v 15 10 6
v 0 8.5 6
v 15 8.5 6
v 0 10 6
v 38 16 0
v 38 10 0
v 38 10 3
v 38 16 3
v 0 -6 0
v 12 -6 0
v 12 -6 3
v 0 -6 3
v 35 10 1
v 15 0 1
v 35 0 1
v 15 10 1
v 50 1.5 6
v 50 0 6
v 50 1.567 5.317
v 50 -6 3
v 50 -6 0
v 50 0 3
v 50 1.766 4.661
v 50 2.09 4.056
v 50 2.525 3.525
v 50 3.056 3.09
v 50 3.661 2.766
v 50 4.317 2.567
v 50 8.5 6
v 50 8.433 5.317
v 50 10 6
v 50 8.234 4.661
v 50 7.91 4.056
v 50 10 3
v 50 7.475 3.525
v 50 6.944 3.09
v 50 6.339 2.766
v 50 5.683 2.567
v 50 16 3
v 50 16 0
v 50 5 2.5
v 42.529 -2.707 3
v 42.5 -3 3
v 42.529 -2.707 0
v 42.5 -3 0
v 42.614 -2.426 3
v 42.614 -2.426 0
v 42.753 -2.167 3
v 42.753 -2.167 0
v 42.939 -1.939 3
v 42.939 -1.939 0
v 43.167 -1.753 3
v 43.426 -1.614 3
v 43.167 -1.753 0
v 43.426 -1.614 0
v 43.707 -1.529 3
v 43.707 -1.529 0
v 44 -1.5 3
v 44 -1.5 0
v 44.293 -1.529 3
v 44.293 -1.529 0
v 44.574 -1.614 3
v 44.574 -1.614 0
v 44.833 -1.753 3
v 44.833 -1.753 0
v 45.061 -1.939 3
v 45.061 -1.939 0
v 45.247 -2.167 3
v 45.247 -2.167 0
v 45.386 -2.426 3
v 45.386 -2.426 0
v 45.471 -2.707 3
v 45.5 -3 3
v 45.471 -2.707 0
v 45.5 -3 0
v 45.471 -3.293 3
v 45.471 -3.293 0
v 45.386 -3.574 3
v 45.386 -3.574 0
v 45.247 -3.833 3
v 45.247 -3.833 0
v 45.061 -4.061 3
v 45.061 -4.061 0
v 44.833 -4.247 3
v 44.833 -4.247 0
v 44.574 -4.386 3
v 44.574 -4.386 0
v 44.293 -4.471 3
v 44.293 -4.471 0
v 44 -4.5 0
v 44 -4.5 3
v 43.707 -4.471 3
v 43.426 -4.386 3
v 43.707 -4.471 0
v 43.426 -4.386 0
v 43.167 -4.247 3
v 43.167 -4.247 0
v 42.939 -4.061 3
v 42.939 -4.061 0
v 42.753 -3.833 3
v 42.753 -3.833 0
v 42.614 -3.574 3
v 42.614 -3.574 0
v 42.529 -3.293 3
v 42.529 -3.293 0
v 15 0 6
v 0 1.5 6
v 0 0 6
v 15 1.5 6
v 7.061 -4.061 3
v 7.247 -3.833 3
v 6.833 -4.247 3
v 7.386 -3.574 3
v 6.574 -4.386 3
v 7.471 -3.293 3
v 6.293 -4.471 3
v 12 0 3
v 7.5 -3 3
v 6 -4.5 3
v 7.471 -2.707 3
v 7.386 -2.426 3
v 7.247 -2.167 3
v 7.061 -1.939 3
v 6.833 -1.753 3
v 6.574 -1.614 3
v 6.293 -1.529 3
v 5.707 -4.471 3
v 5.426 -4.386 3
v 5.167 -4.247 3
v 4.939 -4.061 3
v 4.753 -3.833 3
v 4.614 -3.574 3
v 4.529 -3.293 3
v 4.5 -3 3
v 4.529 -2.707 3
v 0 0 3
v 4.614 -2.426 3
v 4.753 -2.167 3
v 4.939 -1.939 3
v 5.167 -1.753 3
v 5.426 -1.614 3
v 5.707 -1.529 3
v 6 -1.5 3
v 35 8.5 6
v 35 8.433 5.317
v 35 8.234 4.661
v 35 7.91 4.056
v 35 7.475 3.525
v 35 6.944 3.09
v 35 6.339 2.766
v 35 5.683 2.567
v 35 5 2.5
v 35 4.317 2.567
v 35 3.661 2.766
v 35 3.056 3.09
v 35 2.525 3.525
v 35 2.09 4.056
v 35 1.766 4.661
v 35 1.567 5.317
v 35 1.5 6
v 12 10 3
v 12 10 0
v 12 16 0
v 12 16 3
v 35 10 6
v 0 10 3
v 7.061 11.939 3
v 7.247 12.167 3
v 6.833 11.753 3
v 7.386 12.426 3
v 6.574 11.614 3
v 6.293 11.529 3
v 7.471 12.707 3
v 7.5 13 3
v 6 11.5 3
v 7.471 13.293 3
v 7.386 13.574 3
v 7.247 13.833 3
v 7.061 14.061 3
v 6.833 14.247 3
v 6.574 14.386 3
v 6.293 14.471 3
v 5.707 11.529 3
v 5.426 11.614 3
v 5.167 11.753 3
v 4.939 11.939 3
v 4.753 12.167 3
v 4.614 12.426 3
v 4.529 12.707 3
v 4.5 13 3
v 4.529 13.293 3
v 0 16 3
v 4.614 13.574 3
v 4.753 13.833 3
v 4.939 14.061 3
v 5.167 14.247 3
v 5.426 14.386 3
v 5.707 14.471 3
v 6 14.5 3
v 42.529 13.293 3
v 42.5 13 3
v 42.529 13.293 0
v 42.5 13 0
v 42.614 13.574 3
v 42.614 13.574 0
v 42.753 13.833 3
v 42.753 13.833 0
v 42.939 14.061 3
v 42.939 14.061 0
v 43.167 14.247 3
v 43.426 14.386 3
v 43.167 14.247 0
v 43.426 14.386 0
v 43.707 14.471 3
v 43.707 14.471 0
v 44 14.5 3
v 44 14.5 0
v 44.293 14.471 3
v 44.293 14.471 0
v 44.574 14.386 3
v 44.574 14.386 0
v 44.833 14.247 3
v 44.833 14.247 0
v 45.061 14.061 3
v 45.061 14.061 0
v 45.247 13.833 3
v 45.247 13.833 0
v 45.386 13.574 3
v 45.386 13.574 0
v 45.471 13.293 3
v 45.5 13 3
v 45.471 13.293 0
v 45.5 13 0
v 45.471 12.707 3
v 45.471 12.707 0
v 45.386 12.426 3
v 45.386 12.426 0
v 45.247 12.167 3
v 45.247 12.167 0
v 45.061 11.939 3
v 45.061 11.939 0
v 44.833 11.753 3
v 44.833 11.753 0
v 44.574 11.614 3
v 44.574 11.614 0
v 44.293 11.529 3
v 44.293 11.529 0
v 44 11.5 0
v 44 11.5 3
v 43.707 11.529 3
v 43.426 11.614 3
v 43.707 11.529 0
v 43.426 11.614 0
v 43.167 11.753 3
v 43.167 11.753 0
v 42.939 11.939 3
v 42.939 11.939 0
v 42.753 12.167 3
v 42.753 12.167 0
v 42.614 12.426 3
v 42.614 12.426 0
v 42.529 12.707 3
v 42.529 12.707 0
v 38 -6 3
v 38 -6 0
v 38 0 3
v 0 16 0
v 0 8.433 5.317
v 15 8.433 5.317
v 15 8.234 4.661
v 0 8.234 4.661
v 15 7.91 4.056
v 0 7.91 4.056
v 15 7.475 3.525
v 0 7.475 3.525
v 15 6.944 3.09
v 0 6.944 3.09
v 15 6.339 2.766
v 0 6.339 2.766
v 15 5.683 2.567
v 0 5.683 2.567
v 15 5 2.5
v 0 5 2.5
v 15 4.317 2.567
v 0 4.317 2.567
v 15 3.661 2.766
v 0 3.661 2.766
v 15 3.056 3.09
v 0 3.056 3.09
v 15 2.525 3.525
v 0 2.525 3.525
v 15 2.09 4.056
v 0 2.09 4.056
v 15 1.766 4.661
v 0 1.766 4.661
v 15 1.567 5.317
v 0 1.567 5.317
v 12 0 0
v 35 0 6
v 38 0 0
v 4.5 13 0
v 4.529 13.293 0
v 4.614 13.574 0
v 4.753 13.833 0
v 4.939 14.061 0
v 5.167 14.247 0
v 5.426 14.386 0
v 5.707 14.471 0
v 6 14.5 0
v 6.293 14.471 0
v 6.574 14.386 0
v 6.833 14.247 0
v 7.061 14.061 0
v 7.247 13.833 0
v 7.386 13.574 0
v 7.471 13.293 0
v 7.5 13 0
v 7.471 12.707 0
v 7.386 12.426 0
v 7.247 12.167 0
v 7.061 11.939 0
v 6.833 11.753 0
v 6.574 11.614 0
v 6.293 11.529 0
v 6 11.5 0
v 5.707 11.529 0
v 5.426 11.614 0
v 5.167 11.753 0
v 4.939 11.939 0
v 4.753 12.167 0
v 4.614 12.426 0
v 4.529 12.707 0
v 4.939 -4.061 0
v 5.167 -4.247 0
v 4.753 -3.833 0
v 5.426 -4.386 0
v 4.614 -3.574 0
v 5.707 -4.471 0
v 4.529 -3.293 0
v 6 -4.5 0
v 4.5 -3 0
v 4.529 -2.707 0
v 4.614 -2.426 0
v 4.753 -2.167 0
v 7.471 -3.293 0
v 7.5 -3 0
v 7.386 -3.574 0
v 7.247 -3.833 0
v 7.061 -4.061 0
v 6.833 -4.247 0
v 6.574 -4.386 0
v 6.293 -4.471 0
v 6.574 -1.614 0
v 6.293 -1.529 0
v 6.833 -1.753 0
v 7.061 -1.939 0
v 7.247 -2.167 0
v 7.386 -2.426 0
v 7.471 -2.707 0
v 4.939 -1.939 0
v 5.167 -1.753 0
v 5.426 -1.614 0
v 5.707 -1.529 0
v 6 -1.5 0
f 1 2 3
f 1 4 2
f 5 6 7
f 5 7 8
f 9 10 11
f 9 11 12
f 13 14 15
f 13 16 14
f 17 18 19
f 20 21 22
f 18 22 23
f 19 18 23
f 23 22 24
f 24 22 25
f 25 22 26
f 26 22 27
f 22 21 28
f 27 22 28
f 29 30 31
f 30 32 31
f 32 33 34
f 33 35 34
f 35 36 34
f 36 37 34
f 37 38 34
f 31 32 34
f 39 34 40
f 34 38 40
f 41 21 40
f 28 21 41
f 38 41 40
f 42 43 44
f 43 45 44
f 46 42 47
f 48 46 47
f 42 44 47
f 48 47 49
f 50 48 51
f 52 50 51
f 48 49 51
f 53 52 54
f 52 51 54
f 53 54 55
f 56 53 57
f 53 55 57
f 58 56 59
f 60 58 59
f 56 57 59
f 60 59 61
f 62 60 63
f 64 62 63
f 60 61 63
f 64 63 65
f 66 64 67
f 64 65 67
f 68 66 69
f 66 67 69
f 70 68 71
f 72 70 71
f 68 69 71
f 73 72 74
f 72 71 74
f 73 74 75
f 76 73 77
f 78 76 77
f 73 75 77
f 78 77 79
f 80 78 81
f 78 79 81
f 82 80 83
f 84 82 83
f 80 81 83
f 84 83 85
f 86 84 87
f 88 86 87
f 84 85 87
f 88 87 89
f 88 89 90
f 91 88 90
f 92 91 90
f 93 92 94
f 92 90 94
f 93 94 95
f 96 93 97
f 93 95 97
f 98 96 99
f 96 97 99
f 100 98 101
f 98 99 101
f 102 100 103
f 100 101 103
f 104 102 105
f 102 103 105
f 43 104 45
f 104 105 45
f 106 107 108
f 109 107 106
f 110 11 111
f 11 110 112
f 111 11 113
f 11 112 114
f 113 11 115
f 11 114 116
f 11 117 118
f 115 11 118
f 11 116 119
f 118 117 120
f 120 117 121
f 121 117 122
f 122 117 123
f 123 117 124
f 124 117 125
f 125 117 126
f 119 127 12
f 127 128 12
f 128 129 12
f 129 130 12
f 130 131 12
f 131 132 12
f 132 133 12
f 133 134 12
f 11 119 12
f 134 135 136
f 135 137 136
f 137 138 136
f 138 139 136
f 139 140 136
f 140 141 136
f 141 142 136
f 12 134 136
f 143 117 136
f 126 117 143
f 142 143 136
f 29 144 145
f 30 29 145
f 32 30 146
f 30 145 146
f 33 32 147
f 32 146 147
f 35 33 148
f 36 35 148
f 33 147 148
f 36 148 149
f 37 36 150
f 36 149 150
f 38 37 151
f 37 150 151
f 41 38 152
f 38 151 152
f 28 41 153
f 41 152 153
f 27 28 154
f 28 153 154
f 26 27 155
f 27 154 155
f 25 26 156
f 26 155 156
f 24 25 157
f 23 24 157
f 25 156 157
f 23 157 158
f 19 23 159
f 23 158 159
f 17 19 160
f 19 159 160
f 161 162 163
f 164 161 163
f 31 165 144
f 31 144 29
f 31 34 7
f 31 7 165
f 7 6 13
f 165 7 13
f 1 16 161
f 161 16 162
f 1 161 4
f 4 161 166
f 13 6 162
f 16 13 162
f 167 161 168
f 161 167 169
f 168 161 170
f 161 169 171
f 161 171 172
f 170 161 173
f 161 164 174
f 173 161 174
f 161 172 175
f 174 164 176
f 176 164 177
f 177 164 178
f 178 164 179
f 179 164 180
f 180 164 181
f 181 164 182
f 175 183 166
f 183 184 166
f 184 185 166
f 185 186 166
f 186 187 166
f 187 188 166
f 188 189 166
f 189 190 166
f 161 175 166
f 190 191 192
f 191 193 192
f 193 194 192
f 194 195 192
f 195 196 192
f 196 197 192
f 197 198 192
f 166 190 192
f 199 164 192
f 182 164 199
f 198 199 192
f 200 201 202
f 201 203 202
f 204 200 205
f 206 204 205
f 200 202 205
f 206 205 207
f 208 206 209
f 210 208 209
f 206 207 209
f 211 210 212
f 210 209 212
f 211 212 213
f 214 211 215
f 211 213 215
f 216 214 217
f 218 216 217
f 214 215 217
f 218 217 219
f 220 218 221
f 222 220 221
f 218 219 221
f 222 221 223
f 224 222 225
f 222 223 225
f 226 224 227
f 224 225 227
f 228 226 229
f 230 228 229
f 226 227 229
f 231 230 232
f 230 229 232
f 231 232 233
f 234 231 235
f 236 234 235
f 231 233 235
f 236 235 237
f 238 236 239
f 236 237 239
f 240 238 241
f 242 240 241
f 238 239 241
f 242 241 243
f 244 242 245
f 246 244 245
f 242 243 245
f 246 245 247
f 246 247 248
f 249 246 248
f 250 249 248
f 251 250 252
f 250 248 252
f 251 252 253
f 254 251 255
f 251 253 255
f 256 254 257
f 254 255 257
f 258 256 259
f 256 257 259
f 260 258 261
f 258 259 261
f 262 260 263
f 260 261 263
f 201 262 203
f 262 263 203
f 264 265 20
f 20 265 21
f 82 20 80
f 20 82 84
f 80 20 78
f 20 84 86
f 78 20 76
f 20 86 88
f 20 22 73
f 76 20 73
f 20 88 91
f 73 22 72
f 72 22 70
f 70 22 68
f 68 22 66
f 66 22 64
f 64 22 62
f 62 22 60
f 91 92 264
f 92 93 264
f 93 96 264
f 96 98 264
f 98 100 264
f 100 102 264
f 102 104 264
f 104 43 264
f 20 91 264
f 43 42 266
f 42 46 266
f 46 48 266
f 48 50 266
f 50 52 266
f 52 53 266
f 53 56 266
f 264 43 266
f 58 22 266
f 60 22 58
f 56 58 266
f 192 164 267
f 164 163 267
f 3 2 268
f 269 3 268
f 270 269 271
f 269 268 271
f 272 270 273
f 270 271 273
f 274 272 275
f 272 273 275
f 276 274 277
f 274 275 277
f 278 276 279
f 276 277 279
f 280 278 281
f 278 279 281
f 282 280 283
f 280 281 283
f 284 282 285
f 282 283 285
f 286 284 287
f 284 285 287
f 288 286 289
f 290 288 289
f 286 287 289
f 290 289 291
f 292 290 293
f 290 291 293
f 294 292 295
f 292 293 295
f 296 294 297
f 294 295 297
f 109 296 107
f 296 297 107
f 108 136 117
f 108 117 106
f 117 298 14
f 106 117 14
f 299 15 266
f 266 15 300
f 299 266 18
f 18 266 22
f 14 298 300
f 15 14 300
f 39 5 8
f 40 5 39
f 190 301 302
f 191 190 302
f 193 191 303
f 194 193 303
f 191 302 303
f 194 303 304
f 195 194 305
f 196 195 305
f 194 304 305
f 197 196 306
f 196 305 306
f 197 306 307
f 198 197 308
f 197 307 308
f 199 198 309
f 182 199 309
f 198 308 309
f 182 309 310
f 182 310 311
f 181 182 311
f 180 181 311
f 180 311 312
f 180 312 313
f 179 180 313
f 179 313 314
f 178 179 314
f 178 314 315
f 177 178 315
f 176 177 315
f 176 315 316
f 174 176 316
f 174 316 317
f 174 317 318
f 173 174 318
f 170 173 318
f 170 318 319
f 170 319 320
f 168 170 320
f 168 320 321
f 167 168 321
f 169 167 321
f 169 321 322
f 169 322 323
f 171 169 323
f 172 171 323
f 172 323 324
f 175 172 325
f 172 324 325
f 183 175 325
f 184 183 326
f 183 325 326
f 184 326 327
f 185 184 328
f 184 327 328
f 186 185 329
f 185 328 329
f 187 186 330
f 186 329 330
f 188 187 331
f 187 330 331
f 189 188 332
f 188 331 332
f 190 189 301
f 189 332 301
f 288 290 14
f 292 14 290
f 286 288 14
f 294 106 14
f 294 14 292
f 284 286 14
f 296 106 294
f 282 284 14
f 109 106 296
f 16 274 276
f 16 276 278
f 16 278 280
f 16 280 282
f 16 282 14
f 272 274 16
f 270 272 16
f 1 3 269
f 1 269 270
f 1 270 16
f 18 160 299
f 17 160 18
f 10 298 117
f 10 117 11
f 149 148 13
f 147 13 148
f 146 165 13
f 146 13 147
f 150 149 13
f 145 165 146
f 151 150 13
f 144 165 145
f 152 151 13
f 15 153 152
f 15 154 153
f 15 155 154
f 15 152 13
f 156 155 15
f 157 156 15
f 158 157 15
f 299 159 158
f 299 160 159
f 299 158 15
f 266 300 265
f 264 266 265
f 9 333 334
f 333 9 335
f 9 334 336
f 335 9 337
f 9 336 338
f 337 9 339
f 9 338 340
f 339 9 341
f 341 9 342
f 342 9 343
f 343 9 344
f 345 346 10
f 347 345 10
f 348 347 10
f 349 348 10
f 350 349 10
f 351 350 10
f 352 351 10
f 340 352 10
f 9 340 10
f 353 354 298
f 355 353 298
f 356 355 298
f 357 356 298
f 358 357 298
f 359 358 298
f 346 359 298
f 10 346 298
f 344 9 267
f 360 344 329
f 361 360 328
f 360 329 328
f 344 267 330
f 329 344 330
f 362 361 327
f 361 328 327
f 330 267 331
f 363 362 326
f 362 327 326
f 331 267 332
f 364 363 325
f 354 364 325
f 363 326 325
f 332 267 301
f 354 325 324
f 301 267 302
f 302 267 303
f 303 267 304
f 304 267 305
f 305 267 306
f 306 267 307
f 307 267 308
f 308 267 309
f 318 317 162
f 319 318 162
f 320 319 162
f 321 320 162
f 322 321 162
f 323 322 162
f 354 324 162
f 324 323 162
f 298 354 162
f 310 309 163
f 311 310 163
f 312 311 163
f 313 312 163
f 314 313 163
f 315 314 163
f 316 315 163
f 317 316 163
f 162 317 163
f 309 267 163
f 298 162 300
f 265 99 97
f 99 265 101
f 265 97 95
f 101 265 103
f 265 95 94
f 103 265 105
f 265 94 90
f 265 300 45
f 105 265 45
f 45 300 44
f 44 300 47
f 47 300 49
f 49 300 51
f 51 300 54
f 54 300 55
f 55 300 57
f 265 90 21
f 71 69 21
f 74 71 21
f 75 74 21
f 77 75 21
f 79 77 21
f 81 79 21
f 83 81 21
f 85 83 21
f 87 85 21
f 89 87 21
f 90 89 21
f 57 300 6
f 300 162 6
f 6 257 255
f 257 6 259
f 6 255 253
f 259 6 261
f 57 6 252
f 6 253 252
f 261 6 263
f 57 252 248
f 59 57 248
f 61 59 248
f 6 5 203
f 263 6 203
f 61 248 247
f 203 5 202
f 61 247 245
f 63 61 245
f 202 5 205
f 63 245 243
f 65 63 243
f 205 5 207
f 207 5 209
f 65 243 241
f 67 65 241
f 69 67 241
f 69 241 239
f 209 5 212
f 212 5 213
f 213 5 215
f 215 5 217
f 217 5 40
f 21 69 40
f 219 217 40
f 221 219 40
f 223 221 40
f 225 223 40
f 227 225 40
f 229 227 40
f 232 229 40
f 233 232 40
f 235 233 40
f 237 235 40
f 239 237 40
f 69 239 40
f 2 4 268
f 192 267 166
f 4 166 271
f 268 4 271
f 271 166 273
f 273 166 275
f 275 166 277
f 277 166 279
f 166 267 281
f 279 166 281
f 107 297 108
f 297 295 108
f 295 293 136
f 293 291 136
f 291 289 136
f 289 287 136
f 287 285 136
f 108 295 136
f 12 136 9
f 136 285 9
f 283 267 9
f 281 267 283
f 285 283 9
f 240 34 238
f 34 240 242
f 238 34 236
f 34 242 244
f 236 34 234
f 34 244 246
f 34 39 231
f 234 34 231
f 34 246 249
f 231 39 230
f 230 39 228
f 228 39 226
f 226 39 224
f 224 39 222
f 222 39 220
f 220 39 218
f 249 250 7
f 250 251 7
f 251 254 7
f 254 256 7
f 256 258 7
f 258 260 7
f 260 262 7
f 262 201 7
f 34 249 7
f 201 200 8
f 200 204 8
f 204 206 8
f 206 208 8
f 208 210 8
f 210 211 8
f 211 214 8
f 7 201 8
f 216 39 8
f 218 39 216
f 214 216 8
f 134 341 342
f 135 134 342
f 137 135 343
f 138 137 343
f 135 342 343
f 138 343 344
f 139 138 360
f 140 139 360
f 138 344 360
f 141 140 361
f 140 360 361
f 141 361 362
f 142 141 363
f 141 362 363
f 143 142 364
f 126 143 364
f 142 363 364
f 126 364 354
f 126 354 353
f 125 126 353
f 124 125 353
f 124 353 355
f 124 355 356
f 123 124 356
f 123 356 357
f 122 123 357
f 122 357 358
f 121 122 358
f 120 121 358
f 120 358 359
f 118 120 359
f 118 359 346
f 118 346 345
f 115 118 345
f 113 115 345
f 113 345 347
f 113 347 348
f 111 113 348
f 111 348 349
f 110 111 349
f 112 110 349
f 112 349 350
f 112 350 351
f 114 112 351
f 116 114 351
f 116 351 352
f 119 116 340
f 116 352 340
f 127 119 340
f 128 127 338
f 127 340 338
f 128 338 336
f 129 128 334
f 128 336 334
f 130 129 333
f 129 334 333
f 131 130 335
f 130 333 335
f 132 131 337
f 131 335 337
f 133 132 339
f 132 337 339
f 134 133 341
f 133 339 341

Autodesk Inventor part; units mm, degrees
ref_plane "YZ Plane" through (0, 0, 0) normal (1, 0, 0) x (0, 1, 0)
ref_plane "XZ Plane" through (0, 0, 0) normal (0, 1, 0) x (-1, 0, 0)
ref_plane "XY Plane" through (0, 0, 0) normal (0, 0, 1) x (1, 0, 0)
sketch "Sketch1" plane through (0, 0, 0) normal (0, 0, 1) x (1, 0, 0)
  line L0 (0, 0) -> (50, 0)
  line L1 (50, 0) -> (50, 10)
  line L2 (50, 10) -> (0, 10)
  line L3 (0, 10) -> (0, 0)
  dimension "d0" = 50
  dimension "d1" = 10
extrude "Extrusion1" add sketch "Sketch1" along normal blind 6
sketch "Sketch2" plane through (0, 0, 0) normal (-1, 0, 0) x (0, 0, 1)
  circle A0 centre (6, 5) radius 3.5
  line L0 (6, 10) -> (6, 0) projected
  point P0 (0, 0)
  dimension "d4" = 7
extrude "Extrusion2" cut sketch "Sketch2" against normal through all
sketch "Sketch3" plane through (0, 0, 0) normal (0, 0, -1) x (-1, 0, 0)
  line L0 (-50, 0) -> (-50, 10) projected
  line L1 (0, 10) -> (0, 0) projected
  line L2 (-50, 10) -> (-38, 10)
  line L3 (-38, 10) -> (-38, 16)
  line L4 (-38, 16) -> (-50, 16)
  line L5 (-50, 16) -> (-50, 10)
  line L6 (0, 10) -> (-12, 10)
  line L7 (-12, 10) -> (-12, 16)
  line L8 (-12, 16) -> (0, 16)
  line L9 (0, 16) -> (0, 10)
  line L10 (0, 0) -> (-12, 0)
  line L11 (-12, 0) -> (-12, -6)
  line L12 (-12, -6) -> (0, -6)
  line L13 (0, -6) -> (0, 0)
  line L14 (-50, 0) -> (-38, 0)
  line L15 (-38, 0) -> (-38, -6)
  line L16 (-38, -6) -> (-50, -6)
  line L17 (-50, -6) -> (-50, 0)
  circle A0 centre (-44, 13) radius 1.5
  circle A1 centre (-6, 13) radius 1.5
  circle A2 centre (-6, -3) radius 1.5
  circle A3 centre (-44, -3) radius 1.5
  point P0 (-38, 13)
  point P1 (-12, 13)
  point P2 (-12, -3)
  point P3 (-50, -3)
  point P4 (-44, 16)
  point P5 (-6, 16)
  point P6 (-6, 0)
  point P7 (-44, 0)
  dimension "d15" = 12
  dimension "d16" = 6
  dimension "d17" = 12
  dimension "d18" = 6
  dimension "d19" = 12
  dimension "d20" = 6
  dimension "d21" = 12
  dimension "d22" = 6
  dimension "d23" = 3
  dimension "d24" = 3
  dimension "d25" = 3
  dimension "d26" = 3
extrude "Extrusion3" add sketch "Sketch3" against normal blind 3
sketch "Sketch4" plane through (0, 0, 6) normal (0, 0, 1) x (1, 0, 0)
  line L0 (50, 10) -> (0, 10) projected
  line L1 (0, 0) -> (50, 0) projected
  line L2 (15, 10) -> (35, 10)
  line L3 (35, 10) -> (35, 0)
  line L4 (35, 0) -> (15, 0)
  line L5 (15, 0) -> (15, 10)
  point P0 (25, 10)
  dimension "d29" = 20
extrude "Extrusion4" cut sketch "Sketch4" against normal blind 5
equation "\"d15\" = d21"
equation "\"d17\" = d21"
equation "\"d19\" = d21"
properties part number "bearing bed"
